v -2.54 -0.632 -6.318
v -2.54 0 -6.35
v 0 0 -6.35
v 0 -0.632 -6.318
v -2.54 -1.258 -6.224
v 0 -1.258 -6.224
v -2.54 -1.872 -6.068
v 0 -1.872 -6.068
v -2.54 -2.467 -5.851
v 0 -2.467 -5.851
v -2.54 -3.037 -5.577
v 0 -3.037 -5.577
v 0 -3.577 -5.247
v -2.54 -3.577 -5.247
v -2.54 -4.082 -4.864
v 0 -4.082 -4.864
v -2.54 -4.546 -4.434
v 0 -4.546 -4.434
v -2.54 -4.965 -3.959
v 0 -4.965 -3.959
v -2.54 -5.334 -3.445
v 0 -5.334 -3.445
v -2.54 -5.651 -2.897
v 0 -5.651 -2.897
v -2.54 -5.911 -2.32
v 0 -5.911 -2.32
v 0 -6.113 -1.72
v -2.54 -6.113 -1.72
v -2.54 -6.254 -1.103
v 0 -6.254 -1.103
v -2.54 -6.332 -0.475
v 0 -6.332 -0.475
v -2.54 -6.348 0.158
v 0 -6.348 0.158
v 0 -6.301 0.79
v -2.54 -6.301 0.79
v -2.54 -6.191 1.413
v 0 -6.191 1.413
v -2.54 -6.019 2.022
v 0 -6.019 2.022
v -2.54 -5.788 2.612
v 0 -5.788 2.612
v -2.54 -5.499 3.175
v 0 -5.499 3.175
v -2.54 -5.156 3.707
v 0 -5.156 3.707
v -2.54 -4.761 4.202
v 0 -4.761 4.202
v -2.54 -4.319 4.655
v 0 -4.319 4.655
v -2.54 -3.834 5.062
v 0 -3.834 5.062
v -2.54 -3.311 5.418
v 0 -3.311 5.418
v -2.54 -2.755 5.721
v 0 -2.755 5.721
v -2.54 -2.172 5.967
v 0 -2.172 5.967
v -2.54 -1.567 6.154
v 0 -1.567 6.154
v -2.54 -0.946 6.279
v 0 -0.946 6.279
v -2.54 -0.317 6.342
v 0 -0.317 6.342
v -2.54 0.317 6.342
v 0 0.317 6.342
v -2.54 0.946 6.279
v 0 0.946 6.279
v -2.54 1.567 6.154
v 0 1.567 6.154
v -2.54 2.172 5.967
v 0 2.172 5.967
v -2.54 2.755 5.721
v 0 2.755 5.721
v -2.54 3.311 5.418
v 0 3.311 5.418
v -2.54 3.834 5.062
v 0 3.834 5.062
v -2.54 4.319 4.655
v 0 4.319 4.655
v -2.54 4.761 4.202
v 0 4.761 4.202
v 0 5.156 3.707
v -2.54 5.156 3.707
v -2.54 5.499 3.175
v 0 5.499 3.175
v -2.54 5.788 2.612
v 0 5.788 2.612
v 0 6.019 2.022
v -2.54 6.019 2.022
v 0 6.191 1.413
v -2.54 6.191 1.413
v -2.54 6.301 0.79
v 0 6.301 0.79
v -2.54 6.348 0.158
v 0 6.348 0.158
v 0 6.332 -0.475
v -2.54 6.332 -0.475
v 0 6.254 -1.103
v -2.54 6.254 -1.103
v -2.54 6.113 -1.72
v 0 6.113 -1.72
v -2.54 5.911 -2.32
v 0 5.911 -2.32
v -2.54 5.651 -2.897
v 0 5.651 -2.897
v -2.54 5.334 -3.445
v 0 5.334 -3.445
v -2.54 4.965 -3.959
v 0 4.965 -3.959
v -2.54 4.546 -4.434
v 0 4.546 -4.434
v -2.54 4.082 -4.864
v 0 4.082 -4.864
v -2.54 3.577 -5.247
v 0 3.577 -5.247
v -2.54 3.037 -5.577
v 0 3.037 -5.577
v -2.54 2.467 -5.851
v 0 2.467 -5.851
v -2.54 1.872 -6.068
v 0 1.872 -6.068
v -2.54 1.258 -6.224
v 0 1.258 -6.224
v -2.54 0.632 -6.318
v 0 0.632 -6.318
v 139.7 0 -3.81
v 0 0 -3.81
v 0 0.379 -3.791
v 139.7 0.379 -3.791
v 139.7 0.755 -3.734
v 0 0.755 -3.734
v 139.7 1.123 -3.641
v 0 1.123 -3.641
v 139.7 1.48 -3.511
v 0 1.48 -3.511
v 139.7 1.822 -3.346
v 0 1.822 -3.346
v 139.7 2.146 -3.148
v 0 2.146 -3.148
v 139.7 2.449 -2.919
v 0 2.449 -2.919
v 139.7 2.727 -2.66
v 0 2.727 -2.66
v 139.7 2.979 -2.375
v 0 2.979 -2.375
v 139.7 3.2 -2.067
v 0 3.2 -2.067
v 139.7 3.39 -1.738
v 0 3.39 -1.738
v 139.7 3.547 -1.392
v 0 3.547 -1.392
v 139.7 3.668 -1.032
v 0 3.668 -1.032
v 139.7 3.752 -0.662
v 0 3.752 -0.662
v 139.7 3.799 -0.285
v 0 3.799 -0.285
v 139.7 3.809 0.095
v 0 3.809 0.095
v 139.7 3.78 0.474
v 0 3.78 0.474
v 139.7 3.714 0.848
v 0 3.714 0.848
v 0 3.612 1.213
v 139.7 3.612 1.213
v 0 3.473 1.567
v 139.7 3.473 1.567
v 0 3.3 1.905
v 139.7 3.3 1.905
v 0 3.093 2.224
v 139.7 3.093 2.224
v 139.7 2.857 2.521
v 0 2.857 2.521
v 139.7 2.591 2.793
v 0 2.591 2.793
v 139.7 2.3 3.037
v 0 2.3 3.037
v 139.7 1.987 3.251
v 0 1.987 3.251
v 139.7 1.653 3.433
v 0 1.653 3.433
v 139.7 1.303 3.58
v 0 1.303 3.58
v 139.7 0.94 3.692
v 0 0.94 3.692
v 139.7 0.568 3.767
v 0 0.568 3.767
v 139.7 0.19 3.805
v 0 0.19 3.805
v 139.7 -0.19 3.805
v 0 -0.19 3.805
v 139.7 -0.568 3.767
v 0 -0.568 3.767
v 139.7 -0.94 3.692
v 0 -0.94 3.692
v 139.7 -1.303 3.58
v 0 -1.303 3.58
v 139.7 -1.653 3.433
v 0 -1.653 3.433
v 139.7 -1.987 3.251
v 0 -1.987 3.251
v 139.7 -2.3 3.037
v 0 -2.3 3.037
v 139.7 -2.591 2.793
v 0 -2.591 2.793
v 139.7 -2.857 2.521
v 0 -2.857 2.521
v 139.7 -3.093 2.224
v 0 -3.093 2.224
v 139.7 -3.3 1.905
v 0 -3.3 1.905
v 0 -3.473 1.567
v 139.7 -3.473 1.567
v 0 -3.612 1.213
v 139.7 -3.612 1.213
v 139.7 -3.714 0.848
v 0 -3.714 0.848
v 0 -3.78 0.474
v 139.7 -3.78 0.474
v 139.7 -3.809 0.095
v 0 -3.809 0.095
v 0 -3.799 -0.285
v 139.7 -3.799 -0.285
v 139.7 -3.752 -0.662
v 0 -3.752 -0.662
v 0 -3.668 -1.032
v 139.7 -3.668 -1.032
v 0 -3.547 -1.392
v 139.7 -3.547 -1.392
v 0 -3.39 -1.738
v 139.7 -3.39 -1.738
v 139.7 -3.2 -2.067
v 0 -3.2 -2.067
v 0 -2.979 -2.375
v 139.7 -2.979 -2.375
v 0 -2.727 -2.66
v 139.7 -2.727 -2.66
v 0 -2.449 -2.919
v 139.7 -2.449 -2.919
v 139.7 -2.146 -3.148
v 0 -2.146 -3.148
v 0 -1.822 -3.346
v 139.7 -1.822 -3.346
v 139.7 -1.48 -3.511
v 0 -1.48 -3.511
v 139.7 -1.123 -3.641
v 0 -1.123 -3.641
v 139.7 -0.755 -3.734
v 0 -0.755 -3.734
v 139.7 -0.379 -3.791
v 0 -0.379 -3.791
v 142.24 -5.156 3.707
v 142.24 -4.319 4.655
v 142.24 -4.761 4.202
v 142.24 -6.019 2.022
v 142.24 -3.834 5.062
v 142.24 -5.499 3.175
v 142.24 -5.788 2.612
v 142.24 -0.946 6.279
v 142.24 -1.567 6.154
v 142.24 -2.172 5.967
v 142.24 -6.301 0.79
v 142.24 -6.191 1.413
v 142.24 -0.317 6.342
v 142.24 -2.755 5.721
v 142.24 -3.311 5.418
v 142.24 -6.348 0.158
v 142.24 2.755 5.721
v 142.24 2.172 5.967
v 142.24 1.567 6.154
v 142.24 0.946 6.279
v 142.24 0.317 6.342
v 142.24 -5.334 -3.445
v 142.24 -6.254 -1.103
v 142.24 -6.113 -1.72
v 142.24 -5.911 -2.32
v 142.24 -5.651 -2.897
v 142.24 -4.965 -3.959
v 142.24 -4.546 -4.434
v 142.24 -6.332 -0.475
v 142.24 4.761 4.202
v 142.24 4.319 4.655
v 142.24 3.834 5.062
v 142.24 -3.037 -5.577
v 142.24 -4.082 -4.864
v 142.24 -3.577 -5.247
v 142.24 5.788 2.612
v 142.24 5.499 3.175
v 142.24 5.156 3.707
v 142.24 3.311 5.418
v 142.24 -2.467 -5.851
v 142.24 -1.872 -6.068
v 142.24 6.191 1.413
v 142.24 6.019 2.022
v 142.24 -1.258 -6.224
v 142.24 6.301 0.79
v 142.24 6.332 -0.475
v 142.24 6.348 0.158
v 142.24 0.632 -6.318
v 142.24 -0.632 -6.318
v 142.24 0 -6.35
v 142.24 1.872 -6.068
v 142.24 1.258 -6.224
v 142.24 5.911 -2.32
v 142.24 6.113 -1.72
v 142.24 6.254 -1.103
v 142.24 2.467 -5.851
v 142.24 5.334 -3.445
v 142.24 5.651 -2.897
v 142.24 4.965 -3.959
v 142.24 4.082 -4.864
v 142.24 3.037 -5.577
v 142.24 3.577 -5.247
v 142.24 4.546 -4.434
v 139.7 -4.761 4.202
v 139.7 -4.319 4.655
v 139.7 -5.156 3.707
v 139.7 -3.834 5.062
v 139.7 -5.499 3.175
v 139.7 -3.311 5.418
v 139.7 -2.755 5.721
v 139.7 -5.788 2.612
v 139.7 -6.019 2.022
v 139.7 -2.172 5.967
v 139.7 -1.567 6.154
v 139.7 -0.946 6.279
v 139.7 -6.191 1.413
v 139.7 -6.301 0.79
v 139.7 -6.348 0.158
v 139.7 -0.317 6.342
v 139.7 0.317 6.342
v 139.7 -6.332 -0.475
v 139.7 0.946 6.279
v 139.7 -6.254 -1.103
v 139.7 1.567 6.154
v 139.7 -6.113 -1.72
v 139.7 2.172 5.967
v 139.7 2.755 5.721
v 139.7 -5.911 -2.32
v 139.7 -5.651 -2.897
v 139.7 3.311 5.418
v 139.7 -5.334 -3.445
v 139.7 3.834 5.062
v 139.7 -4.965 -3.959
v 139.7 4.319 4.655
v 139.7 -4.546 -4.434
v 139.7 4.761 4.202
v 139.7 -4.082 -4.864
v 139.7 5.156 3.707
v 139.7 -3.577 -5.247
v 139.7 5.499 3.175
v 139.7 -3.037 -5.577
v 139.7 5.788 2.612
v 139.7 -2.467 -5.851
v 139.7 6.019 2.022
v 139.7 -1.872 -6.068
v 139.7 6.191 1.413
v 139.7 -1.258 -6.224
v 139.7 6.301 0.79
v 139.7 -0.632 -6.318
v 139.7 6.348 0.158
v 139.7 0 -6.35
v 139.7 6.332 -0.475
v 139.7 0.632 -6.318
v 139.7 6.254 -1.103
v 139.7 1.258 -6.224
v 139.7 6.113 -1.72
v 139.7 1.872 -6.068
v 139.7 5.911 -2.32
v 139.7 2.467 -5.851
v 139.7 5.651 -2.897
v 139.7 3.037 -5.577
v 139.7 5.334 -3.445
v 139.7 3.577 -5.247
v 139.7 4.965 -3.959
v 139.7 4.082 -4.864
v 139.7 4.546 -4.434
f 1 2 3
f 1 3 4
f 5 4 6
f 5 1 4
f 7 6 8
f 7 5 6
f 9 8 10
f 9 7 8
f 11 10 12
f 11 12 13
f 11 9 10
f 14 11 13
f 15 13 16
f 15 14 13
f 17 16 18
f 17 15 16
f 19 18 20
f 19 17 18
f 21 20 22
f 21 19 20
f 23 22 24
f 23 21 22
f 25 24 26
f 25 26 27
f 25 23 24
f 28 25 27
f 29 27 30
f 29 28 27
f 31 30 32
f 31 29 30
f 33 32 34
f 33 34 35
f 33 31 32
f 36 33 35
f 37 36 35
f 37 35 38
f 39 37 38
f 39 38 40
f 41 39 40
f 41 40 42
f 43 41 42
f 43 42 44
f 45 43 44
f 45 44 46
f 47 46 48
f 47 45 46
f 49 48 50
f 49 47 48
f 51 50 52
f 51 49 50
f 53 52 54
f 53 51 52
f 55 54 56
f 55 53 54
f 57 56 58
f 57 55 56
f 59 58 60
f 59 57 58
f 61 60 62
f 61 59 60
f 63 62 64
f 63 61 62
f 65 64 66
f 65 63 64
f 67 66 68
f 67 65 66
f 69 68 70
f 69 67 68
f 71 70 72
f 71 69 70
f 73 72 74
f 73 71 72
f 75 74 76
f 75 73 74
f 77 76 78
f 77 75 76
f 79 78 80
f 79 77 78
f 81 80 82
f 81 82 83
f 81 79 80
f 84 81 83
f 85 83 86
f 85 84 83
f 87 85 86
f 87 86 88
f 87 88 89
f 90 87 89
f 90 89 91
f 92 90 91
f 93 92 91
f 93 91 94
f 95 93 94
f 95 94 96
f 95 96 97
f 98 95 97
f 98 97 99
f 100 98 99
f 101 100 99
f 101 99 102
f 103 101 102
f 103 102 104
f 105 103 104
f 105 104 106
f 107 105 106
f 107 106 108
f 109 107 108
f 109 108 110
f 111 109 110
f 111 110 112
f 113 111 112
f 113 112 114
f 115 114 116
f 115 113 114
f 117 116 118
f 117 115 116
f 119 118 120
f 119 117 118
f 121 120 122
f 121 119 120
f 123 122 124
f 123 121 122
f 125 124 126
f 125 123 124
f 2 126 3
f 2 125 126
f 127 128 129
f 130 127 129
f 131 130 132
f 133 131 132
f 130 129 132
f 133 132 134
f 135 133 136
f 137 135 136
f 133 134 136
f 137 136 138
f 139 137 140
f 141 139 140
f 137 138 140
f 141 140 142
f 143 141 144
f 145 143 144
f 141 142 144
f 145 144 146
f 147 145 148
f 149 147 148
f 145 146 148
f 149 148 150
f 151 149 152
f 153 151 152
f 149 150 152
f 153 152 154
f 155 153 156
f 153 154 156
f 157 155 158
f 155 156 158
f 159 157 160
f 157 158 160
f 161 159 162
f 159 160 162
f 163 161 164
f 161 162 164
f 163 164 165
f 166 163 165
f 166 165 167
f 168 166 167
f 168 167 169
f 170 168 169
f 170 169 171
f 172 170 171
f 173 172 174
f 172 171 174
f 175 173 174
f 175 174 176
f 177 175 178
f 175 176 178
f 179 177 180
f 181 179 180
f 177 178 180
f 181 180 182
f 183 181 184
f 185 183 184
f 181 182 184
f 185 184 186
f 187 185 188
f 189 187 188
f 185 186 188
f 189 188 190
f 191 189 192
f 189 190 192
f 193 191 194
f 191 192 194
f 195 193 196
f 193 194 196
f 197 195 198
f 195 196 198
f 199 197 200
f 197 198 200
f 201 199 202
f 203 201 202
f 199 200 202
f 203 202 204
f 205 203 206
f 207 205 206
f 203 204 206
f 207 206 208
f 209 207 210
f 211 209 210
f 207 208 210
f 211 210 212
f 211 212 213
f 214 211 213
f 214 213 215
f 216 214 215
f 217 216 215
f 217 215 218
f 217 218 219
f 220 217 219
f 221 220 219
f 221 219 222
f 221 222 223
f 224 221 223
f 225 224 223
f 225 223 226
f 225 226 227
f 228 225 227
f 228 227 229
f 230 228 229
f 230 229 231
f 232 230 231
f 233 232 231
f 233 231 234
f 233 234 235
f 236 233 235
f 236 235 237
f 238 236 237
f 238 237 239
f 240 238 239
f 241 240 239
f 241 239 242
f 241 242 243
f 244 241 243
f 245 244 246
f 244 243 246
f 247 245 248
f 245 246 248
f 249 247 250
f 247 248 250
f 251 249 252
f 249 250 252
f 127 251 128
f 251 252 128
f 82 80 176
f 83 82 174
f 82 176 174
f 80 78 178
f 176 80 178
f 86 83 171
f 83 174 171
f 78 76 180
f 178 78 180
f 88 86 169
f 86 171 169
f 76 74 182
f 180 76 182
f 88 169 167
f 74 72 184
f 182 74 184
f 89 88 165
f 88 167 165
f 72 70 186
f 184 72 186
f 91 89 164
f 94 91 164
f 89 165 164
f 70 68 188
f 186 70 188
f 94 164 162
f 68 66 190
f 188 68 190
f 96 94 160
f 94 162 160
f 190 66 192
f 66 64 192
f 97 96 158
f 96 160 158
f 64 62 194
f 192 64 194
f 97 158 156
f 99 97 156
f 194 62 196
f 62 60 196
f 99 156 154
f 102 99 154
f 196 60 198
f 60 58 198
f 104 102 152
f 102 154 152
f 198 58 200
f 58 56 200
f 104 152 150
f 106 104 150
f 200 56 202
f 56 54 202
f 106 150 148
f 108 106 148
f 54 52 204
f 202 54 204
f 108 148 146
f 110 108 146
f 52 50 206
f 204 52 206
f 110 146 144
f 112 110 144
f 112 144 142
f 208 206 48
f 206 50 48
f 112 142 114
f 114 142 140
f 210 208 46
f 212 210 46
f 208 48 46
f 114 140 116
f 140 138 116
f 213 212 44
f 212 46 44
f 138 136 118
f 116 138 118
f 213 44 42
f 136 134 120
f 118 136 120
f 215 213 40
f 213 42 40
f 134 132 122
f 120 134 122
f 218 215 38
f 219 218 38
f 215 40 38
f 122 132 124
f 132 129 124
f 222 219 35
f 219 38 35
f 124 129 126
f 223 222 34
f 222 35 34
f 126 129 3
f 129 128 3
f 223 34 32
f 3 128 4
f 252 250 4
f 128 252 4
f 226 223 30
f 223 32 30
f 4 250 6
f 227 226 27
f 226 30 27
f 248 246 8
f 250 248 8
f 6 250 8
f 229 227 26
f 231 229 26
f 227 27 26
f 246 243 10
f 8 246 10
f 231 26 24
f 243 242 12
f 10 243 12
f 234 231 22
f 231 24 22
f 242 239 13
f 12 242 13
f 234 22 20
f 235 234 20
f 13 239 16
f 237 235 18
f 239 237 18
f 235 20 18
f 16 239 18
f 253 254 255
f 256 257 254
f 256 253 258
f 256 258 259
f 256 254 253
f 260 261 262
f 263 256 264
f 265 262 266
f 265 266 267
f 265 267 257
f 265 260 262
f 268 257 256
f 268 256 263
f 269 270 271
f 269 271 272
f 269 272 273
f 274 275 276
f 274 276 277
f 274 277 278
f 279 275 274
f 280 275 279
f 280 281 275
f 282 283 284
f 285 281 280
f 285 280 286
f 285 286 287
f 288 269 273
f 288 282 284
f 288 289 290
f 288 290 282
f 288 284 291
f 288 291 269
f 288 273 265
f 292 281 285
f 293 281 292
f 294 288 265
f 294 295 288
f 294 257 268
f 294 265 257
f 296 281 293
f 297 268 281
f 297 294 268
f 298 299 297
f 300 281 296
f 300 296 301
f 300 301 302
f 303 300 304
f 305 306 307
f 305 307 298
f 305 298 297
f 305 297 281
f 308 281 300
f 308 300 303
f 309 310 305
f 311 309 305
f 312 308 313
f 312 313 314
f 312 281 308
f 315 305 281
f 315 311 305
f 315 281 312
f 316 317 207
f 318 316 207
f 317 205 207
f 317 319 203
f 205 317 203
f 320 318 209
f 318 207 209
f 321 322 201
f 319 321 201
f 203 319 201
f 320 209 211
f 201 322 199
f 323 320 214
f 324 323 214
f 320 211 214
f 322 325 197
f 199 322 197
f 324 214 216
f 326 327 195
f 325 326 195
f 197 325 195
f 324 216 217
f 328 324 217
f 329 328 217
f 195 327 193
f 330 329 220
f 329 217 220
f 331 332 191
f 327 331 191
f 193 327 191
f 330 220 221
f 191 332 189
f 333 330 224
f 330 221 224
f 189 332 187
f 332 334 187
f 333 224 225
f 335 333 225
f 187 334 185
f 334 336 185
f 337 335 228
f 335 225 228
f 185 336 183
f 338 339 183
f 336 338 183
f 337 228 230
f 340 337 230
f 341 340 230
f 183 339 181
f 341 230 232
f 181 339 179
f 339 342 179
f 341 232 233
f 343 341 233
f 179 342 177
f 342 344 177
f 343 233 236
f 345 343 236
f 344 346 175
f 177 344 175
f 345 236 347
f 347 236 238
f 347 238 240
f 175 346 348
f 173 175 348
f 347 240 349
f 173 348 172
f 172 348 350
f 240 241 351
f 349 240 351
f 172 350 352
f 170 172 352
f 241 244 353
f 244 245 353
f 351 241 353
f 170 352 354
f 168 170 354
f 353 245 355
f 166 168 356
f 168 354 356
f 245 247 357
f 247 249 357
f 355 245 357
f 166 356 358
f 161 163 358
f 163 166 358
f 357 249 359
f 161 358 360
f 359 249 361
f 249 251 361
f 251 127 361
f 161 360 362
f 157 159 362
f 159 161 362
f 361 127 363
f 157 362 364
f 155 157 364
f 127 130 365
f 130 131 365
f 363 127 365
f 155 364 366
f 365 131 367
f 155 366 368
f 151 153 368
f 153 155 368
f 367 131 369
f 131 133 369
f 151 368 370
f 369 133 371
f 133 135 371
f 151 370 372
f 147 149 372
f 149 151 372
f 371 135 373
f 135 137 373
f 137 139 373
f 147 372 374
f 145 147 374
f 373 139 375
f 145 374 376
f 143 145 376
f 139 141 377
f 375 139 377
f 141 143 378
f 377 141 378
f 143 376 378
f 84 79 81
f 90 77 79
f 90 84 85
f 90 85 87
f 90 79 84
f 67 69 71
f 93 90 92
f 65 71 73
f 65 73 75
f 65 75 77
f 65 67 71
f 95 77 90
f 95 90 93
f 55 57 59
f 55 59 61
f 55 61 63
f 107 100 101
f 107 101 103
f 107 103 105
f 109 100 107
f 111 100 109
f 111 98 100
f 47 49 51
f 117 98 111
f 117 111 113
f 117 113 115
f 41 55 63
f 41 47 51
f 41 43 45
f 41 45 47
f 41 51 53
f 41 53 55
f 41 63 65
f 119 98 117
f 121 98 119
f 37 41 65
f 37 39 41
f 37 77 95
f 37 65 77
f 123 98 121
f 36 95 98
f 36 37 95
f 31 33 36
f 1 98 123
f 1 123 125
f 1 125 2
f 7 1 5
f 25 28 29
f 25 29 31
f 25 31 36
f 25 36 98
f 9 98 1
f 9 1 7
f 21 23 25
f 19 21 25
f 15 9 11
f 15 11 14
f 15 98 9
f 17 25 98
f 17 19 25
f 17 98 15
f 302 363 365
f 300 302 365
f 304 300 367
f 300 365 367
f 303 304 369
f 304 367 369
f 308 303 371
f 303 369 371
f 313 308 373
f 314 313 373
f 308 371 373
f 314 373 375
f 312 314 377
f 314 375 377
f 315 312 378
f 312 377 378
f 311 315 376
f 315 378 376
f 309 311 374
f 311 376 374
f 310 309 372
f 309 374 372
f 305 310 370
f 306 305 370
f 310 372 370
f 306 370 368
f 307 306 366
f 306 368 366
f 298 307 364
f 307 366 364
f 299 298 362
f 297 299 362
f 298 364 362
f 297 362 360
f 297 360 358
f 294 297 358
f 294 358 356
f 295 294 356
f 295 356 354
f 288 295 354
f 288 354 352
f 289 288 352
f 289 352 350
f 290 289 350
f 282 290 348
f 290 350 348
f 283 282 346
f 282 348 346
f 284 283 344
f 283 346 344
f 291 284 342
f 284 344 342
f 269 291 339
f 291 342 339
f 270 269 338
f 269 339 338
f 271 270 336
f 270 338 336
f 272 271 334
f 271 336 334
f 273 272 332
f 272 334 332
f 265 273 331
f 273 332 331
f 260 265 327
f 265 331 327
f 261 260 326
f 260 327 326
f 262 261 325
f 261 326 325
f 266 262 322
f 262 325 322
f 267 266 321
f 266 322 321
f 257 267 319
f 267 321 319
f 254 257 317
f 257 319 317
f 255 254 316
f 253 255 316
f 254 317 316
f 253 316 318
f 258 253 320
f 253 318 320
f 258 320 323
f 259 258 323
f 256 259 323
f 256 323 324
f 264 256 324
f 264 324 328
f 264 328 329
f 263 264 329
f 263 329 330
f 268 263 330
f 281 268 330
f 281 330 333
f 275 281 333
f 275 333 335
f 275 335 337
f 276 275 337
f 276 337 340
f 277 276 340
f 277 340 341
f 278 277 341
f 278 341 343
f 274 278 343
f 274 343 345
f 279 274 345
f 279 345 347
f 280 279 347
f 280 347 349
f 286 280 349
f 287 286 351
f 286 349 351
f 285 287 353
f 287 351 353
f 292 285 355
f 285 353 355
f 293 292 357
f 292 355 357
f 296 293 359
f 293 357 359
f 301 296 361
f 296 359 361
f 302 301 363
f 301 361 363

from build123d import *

# Parameters (mm, degrees)
SKETCH1_R           = 3.81
BOSS_EXTRUDE1_DEPTH = 139.7
SKETCH2_R           = 6.35
BOSS_EXTRUDE2_DEPTH = 2.54
BOSS_EXTRUDE3_START = 2.54
SKETCH3_R           = 6.35
BOSS_EXTRUDE3_DEPTH = 2.54


with BuildPart() as part:
    # Sketch1 → Boss-Extrude1 (new body)
    with BuildSketch(Plane(origin=(0, 0, 0), x_dir=(0, 0, -1), z_dir=(1, 0, 0))):
        Circle(SKETCH1_R)
    extrude(amount=BOSS_EXTRUDE1_DEPTH)

    # Sketch2 → Boss-Extrude2 (add)
    with BuildSketch(Plane(origin=(139.7, 0, 0), x_dir=(0, 0, -1), z_dir=(1, 0, 0))):
        Circle(SKETCH2_R)
    extrude(amount=BOSS_EXTRUDE2_DEPTH)

    # Sketch3 → Boss-Extrude3 (add)
    with BuildSketch(Plane.ZY.offset(BOSS_EXTRUDE3_START)):
        with Locations(Location((0, 0, 0), (0, 0, 180))):
            Circle(SKETCH3_R)
    extrude(amount=-BOSS_EXTRUDE3_DEPTH)


solid = part.part
